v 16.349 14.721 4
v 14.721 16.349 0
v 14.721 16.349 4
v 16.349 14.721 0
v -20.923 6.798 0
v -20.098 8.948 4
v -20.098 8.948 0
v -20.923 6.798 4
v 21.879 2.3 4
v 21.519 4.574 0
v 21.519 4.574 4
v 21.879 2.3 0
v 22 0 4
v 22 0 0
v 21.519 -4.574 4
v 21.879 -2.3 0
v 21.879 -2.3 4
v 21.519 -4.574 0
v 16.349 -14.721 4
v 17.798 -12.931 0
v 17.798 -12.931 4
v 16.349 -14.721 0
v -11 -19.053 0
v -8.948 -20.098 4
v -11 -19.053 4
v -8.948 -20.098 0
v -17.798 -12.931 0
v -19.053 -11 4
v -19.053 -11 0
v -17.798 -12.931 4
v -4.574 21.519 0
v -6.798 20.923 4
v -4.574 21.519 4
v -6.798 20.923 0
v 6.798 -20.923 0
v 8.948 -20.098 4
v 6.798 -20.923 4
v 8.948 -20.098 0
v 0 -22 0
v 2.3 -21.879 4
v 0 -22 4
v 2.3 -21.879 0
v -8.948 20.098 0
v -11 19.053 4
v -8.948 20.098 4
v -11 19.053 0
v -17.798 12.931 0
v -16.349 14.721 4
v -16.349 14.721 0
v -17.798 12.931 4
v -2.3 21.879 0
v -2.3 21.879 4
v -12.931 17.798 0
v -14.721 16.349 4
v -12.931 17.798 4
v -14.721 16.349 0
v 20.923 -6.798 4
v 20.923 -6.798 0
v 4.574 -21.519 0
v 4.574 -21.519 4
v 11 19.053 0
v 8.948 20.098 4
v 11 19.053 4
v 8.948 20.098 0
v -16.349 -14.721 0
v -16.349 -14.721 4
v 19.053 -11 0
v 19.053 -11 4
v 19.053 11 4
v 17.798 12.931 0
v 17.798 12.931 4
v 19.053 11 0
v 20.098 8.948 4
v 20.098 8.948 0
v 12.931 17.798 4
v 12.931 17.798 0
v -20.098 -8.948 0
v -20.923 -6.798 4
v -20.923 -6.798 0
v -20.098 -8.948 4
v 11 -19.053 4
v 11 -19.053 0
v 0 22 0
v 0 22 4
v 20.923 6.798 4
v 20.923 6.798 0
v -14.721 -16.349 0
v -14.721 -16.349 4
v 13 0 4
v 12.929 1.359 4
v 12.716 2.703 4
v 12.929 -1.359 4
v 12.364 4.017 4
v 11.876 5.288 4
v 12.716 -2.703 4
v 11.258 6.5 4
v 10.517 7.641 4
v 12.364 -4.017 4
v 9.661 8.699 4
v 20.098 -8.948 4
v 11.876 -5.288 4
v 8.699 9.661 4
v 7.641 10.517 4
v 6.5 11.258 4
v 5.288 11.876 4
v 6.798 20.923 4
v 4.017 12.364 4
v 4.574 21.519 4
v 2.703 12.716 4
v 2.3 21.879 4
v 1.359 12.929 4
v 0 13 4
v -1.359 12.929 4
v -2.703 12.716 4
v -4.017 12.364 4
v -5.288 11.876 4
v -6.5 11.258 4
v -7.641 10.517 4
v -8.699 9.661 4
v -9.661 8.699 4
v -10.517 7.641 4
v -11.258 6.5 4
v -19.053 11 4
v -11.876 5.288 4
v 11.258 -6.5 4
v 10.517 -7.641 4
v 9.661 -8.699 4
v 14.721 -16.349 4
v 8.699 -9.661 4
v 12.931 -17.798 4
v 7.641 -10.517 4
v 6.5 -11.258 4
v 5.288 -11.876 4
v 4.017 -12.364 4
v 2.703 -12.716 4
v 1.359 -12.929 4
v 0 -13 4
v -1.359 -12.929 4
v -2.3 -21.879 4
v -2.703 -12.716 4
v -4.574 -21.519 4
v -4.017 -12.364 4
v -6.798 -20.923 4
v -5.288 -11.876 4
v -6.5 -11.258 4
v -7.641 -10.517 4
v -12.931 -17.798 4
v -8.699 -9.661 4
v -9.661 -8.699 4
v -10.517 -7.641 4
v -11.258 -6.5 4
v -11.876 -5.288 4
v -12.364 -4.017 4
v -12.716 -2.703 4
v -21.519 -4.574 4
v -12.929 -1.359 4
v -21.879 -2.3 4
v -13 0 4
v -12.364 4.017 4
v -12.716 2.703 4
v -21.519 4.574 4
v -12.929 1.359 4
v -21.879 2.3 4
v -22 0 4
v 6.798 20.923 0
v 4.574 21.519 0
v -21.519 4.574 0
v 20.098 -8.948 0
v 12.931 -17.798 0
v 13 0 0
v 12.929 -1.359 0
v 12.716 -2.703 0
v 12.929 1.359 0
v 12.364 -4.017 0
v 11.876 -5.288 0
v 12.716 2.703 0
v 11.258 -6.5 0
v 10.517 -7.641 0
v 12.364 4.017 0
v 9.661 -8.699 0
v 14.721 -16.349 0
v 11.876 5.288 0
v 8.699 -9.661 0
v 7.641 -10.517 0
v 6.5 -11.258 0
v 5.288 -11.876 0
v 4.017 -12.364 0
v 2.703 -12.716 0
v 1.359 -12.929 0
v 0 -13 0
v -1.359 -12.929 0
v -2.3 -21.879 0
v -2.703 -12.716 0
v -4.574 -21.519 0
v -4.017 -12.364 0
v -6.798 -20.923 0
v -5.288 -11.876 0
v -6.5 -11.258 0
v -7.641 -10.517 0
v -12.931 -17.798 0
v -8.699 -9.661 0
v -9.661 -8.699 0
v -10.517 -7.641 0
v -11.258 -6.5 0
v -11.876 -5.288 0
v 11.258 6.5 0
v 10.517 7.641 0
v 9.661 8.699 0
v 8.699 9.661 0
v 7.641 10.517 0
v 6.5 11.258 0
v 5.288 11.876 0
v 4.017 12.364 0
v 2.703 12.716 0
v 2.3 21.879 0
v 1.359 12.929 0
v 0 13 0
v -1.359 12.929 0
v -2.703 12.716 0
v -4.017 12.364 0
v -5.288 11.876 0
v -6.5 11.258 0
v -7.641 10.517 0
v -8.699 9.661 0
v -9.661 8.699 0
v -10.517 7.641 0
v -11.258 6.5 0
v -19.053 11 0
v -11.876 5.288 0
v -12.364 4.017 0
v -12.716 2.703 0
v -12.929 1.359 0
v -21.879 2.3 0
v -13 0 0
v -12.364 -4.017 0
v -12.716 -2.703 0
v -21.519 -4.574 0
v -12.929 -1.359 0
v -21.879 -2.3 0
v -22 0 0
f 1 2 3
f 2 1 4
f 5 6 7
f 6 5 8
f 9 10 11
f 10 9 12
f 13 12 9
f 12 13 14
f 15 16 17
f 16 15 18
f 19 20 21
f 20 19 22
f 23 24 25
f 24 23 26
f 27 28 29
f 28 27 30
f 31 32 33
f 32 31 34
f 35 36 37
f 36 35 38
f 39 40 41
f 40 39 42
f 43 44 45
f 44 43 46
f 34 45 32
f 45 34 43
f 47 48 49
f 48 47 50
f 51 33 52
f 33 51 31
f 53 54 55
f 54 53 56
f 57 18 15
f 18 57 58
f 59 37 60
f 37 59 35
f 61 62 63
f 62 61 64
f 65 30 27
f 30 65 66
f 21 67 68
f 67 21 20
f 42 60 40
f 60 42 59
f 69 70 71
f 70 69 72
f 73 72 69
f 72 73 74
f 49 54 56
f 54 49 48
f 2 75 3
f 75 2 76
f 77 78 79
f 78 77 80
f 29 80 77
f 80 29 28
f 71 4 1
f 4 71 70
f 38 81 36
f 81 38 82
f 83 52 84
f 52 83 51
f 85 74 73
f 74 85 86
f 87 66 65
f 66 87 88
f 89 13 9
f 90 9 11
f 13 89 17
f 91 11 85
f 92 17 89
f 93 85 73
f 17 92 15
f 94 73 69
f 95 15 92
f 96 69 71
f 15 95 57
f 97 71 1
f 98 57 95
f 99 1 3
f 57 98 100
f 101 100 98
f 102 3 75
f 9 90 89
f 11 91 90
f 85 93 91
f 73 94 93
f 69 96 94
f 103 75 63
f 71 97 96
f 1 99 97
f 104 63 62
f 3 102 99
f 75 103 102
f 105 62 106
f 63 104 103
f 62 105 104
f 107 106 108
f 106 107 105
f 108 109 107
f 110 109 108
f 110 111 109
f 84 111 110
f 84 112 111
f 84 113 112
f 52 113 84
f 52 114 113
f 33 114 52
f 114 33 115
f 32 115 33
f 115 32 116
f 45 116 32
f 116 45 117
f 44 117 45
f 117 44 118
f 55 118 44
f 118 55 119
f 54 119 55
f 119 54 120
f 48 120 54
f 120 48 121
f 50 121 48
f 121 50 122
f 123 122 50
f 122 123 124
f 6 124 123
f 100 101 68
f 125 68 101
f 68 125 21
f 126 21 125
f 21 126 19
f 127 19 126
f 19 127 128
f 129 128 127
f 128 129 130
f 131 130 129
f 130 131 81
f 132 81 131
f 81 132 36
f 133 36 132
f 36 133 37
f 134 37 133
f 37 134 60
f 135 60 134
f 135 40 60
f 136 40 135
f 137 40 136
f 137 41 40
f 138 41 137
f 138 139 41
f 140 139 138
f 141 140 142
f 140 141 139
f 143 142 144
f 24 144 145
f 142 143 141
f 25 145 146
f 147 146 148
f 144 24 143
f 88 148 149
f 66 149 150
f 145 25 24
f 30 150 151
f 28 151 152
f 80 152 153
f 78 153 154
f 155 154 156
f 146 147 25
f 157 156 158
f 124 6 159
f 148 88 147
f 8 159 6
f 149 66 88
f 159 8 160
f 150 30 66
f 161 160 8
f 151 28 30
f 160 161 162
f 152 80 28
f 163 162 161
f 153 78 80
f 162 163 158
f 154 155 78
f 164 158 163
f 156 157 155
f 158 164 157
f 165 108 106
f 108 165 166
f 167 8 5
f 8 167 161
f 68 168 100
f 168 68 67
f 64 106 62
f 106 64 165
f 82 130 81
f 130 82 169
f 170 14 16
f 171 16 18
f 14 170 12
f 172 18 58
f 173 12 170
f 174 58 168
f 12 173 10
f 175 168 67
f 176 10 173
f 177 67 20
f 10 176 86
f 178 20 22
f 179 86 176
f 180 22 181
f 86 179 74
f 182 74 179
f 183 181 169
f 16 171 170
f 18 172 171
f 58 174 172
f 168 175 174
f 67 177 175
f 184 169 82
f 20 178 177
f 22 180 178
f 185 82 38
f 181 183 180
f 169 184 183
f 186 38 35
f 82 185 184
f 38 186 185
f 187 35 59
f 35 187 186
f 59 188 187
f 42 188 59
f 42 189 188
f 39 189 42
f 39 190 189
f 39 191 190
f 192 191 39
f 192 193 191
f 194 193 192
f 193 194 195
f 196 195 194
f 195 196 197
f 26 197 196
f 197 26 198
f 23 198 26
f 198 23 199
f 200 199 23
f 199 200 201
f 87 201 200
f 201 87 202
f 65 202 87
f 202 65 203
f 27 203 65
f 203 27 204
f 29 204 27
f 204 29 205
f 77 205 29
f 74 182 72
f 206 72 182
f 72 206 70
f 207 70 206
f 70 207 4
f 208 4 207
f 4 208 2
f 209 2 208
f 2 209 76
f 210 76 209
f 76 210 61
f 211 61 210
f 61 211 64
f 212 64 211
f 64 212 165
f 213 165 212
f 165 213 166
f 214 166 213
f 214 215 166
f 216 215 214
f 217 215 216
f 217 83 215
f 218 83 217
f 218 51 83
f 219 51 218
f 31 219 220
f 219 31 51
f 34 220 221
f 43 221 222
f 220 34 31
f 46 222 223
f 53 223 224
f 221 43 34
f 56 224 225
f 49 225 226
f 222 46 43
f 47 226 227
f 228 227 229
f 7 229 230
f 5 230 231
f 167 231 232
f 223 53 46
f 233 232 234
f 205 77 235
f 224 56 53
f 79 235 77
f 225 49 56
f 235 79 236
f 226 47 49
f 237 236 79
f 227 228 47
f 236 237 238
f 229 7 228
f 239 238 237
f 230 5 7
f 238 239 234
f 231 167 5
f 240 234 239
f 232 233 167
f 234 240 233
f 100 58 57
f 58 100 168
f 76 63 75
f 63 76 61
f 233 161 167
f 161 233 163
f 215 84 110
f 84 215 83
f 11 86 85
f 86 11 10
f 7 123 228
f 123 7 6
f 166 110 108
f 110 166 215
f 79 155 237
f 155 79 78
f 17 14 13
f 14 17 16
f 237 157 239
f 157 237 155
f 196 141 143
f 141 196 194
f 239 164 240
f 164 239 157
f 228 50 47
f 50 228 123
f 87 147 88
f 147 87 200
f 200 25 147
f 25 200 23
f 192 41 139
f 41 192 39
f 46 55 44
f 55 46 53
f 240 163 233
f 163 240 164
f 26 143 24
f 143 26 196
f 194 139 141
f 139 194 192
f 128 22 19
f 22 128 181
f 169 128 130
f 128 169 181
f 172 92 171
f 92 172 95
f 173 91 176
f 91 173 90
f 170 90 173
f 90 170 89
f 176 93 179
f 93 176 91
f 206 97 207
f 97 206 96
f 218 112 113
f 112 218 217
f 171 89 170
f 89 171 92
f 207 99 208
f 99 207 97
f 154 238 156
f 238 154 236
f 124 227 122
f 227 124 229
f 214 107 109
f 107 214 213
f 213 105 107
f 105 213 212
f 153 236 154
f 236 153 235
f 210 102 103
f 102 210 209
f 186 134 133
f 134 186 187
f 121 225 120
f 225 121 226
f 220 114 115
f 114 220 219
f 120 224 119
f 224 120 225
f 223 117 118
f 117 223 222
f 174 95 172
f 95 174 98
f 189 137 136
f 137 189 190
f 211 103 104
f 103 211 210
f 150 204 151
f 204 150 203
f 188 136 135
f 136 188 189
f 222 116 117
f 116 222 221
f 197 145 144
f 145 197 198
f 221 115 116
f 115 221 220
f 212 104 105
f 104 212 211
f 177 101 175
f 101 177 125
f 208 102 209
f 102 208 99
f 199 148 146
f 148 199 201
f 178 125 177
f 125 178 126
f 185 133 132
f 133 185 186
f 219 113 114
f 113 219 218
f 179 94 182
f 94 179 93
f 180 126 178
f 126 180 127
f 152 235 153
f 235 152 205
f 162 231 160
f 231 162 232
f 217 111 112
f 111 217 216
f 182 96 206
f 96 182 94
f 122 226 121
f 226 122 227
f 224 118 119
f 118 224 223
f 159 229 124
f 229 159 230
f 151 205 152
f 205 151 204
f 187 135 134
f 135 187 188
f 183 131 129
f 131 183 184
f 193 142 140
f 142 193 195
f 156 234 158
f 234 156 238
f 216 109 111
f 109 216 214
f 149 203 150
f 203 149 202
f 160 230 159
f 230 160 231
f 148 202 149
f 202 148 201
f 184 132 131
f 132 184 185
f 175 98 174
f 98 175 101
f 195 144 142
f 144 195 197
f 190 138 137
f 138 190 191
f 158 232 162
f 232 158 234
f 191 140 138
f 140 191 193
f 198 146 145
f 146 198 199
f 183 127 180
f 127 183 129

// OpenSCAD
// Flat metric washer.
$fn = 60;
eps = 0.02;
inner_d = 26;
outer_d = 44;
thickness = 4;
difference() {
    cylinder(d = outer_d, h = thickness);
    translate([0, 0, -eps]) cylinder(d = inner_d, h = thickness + 2 * eps);
}
